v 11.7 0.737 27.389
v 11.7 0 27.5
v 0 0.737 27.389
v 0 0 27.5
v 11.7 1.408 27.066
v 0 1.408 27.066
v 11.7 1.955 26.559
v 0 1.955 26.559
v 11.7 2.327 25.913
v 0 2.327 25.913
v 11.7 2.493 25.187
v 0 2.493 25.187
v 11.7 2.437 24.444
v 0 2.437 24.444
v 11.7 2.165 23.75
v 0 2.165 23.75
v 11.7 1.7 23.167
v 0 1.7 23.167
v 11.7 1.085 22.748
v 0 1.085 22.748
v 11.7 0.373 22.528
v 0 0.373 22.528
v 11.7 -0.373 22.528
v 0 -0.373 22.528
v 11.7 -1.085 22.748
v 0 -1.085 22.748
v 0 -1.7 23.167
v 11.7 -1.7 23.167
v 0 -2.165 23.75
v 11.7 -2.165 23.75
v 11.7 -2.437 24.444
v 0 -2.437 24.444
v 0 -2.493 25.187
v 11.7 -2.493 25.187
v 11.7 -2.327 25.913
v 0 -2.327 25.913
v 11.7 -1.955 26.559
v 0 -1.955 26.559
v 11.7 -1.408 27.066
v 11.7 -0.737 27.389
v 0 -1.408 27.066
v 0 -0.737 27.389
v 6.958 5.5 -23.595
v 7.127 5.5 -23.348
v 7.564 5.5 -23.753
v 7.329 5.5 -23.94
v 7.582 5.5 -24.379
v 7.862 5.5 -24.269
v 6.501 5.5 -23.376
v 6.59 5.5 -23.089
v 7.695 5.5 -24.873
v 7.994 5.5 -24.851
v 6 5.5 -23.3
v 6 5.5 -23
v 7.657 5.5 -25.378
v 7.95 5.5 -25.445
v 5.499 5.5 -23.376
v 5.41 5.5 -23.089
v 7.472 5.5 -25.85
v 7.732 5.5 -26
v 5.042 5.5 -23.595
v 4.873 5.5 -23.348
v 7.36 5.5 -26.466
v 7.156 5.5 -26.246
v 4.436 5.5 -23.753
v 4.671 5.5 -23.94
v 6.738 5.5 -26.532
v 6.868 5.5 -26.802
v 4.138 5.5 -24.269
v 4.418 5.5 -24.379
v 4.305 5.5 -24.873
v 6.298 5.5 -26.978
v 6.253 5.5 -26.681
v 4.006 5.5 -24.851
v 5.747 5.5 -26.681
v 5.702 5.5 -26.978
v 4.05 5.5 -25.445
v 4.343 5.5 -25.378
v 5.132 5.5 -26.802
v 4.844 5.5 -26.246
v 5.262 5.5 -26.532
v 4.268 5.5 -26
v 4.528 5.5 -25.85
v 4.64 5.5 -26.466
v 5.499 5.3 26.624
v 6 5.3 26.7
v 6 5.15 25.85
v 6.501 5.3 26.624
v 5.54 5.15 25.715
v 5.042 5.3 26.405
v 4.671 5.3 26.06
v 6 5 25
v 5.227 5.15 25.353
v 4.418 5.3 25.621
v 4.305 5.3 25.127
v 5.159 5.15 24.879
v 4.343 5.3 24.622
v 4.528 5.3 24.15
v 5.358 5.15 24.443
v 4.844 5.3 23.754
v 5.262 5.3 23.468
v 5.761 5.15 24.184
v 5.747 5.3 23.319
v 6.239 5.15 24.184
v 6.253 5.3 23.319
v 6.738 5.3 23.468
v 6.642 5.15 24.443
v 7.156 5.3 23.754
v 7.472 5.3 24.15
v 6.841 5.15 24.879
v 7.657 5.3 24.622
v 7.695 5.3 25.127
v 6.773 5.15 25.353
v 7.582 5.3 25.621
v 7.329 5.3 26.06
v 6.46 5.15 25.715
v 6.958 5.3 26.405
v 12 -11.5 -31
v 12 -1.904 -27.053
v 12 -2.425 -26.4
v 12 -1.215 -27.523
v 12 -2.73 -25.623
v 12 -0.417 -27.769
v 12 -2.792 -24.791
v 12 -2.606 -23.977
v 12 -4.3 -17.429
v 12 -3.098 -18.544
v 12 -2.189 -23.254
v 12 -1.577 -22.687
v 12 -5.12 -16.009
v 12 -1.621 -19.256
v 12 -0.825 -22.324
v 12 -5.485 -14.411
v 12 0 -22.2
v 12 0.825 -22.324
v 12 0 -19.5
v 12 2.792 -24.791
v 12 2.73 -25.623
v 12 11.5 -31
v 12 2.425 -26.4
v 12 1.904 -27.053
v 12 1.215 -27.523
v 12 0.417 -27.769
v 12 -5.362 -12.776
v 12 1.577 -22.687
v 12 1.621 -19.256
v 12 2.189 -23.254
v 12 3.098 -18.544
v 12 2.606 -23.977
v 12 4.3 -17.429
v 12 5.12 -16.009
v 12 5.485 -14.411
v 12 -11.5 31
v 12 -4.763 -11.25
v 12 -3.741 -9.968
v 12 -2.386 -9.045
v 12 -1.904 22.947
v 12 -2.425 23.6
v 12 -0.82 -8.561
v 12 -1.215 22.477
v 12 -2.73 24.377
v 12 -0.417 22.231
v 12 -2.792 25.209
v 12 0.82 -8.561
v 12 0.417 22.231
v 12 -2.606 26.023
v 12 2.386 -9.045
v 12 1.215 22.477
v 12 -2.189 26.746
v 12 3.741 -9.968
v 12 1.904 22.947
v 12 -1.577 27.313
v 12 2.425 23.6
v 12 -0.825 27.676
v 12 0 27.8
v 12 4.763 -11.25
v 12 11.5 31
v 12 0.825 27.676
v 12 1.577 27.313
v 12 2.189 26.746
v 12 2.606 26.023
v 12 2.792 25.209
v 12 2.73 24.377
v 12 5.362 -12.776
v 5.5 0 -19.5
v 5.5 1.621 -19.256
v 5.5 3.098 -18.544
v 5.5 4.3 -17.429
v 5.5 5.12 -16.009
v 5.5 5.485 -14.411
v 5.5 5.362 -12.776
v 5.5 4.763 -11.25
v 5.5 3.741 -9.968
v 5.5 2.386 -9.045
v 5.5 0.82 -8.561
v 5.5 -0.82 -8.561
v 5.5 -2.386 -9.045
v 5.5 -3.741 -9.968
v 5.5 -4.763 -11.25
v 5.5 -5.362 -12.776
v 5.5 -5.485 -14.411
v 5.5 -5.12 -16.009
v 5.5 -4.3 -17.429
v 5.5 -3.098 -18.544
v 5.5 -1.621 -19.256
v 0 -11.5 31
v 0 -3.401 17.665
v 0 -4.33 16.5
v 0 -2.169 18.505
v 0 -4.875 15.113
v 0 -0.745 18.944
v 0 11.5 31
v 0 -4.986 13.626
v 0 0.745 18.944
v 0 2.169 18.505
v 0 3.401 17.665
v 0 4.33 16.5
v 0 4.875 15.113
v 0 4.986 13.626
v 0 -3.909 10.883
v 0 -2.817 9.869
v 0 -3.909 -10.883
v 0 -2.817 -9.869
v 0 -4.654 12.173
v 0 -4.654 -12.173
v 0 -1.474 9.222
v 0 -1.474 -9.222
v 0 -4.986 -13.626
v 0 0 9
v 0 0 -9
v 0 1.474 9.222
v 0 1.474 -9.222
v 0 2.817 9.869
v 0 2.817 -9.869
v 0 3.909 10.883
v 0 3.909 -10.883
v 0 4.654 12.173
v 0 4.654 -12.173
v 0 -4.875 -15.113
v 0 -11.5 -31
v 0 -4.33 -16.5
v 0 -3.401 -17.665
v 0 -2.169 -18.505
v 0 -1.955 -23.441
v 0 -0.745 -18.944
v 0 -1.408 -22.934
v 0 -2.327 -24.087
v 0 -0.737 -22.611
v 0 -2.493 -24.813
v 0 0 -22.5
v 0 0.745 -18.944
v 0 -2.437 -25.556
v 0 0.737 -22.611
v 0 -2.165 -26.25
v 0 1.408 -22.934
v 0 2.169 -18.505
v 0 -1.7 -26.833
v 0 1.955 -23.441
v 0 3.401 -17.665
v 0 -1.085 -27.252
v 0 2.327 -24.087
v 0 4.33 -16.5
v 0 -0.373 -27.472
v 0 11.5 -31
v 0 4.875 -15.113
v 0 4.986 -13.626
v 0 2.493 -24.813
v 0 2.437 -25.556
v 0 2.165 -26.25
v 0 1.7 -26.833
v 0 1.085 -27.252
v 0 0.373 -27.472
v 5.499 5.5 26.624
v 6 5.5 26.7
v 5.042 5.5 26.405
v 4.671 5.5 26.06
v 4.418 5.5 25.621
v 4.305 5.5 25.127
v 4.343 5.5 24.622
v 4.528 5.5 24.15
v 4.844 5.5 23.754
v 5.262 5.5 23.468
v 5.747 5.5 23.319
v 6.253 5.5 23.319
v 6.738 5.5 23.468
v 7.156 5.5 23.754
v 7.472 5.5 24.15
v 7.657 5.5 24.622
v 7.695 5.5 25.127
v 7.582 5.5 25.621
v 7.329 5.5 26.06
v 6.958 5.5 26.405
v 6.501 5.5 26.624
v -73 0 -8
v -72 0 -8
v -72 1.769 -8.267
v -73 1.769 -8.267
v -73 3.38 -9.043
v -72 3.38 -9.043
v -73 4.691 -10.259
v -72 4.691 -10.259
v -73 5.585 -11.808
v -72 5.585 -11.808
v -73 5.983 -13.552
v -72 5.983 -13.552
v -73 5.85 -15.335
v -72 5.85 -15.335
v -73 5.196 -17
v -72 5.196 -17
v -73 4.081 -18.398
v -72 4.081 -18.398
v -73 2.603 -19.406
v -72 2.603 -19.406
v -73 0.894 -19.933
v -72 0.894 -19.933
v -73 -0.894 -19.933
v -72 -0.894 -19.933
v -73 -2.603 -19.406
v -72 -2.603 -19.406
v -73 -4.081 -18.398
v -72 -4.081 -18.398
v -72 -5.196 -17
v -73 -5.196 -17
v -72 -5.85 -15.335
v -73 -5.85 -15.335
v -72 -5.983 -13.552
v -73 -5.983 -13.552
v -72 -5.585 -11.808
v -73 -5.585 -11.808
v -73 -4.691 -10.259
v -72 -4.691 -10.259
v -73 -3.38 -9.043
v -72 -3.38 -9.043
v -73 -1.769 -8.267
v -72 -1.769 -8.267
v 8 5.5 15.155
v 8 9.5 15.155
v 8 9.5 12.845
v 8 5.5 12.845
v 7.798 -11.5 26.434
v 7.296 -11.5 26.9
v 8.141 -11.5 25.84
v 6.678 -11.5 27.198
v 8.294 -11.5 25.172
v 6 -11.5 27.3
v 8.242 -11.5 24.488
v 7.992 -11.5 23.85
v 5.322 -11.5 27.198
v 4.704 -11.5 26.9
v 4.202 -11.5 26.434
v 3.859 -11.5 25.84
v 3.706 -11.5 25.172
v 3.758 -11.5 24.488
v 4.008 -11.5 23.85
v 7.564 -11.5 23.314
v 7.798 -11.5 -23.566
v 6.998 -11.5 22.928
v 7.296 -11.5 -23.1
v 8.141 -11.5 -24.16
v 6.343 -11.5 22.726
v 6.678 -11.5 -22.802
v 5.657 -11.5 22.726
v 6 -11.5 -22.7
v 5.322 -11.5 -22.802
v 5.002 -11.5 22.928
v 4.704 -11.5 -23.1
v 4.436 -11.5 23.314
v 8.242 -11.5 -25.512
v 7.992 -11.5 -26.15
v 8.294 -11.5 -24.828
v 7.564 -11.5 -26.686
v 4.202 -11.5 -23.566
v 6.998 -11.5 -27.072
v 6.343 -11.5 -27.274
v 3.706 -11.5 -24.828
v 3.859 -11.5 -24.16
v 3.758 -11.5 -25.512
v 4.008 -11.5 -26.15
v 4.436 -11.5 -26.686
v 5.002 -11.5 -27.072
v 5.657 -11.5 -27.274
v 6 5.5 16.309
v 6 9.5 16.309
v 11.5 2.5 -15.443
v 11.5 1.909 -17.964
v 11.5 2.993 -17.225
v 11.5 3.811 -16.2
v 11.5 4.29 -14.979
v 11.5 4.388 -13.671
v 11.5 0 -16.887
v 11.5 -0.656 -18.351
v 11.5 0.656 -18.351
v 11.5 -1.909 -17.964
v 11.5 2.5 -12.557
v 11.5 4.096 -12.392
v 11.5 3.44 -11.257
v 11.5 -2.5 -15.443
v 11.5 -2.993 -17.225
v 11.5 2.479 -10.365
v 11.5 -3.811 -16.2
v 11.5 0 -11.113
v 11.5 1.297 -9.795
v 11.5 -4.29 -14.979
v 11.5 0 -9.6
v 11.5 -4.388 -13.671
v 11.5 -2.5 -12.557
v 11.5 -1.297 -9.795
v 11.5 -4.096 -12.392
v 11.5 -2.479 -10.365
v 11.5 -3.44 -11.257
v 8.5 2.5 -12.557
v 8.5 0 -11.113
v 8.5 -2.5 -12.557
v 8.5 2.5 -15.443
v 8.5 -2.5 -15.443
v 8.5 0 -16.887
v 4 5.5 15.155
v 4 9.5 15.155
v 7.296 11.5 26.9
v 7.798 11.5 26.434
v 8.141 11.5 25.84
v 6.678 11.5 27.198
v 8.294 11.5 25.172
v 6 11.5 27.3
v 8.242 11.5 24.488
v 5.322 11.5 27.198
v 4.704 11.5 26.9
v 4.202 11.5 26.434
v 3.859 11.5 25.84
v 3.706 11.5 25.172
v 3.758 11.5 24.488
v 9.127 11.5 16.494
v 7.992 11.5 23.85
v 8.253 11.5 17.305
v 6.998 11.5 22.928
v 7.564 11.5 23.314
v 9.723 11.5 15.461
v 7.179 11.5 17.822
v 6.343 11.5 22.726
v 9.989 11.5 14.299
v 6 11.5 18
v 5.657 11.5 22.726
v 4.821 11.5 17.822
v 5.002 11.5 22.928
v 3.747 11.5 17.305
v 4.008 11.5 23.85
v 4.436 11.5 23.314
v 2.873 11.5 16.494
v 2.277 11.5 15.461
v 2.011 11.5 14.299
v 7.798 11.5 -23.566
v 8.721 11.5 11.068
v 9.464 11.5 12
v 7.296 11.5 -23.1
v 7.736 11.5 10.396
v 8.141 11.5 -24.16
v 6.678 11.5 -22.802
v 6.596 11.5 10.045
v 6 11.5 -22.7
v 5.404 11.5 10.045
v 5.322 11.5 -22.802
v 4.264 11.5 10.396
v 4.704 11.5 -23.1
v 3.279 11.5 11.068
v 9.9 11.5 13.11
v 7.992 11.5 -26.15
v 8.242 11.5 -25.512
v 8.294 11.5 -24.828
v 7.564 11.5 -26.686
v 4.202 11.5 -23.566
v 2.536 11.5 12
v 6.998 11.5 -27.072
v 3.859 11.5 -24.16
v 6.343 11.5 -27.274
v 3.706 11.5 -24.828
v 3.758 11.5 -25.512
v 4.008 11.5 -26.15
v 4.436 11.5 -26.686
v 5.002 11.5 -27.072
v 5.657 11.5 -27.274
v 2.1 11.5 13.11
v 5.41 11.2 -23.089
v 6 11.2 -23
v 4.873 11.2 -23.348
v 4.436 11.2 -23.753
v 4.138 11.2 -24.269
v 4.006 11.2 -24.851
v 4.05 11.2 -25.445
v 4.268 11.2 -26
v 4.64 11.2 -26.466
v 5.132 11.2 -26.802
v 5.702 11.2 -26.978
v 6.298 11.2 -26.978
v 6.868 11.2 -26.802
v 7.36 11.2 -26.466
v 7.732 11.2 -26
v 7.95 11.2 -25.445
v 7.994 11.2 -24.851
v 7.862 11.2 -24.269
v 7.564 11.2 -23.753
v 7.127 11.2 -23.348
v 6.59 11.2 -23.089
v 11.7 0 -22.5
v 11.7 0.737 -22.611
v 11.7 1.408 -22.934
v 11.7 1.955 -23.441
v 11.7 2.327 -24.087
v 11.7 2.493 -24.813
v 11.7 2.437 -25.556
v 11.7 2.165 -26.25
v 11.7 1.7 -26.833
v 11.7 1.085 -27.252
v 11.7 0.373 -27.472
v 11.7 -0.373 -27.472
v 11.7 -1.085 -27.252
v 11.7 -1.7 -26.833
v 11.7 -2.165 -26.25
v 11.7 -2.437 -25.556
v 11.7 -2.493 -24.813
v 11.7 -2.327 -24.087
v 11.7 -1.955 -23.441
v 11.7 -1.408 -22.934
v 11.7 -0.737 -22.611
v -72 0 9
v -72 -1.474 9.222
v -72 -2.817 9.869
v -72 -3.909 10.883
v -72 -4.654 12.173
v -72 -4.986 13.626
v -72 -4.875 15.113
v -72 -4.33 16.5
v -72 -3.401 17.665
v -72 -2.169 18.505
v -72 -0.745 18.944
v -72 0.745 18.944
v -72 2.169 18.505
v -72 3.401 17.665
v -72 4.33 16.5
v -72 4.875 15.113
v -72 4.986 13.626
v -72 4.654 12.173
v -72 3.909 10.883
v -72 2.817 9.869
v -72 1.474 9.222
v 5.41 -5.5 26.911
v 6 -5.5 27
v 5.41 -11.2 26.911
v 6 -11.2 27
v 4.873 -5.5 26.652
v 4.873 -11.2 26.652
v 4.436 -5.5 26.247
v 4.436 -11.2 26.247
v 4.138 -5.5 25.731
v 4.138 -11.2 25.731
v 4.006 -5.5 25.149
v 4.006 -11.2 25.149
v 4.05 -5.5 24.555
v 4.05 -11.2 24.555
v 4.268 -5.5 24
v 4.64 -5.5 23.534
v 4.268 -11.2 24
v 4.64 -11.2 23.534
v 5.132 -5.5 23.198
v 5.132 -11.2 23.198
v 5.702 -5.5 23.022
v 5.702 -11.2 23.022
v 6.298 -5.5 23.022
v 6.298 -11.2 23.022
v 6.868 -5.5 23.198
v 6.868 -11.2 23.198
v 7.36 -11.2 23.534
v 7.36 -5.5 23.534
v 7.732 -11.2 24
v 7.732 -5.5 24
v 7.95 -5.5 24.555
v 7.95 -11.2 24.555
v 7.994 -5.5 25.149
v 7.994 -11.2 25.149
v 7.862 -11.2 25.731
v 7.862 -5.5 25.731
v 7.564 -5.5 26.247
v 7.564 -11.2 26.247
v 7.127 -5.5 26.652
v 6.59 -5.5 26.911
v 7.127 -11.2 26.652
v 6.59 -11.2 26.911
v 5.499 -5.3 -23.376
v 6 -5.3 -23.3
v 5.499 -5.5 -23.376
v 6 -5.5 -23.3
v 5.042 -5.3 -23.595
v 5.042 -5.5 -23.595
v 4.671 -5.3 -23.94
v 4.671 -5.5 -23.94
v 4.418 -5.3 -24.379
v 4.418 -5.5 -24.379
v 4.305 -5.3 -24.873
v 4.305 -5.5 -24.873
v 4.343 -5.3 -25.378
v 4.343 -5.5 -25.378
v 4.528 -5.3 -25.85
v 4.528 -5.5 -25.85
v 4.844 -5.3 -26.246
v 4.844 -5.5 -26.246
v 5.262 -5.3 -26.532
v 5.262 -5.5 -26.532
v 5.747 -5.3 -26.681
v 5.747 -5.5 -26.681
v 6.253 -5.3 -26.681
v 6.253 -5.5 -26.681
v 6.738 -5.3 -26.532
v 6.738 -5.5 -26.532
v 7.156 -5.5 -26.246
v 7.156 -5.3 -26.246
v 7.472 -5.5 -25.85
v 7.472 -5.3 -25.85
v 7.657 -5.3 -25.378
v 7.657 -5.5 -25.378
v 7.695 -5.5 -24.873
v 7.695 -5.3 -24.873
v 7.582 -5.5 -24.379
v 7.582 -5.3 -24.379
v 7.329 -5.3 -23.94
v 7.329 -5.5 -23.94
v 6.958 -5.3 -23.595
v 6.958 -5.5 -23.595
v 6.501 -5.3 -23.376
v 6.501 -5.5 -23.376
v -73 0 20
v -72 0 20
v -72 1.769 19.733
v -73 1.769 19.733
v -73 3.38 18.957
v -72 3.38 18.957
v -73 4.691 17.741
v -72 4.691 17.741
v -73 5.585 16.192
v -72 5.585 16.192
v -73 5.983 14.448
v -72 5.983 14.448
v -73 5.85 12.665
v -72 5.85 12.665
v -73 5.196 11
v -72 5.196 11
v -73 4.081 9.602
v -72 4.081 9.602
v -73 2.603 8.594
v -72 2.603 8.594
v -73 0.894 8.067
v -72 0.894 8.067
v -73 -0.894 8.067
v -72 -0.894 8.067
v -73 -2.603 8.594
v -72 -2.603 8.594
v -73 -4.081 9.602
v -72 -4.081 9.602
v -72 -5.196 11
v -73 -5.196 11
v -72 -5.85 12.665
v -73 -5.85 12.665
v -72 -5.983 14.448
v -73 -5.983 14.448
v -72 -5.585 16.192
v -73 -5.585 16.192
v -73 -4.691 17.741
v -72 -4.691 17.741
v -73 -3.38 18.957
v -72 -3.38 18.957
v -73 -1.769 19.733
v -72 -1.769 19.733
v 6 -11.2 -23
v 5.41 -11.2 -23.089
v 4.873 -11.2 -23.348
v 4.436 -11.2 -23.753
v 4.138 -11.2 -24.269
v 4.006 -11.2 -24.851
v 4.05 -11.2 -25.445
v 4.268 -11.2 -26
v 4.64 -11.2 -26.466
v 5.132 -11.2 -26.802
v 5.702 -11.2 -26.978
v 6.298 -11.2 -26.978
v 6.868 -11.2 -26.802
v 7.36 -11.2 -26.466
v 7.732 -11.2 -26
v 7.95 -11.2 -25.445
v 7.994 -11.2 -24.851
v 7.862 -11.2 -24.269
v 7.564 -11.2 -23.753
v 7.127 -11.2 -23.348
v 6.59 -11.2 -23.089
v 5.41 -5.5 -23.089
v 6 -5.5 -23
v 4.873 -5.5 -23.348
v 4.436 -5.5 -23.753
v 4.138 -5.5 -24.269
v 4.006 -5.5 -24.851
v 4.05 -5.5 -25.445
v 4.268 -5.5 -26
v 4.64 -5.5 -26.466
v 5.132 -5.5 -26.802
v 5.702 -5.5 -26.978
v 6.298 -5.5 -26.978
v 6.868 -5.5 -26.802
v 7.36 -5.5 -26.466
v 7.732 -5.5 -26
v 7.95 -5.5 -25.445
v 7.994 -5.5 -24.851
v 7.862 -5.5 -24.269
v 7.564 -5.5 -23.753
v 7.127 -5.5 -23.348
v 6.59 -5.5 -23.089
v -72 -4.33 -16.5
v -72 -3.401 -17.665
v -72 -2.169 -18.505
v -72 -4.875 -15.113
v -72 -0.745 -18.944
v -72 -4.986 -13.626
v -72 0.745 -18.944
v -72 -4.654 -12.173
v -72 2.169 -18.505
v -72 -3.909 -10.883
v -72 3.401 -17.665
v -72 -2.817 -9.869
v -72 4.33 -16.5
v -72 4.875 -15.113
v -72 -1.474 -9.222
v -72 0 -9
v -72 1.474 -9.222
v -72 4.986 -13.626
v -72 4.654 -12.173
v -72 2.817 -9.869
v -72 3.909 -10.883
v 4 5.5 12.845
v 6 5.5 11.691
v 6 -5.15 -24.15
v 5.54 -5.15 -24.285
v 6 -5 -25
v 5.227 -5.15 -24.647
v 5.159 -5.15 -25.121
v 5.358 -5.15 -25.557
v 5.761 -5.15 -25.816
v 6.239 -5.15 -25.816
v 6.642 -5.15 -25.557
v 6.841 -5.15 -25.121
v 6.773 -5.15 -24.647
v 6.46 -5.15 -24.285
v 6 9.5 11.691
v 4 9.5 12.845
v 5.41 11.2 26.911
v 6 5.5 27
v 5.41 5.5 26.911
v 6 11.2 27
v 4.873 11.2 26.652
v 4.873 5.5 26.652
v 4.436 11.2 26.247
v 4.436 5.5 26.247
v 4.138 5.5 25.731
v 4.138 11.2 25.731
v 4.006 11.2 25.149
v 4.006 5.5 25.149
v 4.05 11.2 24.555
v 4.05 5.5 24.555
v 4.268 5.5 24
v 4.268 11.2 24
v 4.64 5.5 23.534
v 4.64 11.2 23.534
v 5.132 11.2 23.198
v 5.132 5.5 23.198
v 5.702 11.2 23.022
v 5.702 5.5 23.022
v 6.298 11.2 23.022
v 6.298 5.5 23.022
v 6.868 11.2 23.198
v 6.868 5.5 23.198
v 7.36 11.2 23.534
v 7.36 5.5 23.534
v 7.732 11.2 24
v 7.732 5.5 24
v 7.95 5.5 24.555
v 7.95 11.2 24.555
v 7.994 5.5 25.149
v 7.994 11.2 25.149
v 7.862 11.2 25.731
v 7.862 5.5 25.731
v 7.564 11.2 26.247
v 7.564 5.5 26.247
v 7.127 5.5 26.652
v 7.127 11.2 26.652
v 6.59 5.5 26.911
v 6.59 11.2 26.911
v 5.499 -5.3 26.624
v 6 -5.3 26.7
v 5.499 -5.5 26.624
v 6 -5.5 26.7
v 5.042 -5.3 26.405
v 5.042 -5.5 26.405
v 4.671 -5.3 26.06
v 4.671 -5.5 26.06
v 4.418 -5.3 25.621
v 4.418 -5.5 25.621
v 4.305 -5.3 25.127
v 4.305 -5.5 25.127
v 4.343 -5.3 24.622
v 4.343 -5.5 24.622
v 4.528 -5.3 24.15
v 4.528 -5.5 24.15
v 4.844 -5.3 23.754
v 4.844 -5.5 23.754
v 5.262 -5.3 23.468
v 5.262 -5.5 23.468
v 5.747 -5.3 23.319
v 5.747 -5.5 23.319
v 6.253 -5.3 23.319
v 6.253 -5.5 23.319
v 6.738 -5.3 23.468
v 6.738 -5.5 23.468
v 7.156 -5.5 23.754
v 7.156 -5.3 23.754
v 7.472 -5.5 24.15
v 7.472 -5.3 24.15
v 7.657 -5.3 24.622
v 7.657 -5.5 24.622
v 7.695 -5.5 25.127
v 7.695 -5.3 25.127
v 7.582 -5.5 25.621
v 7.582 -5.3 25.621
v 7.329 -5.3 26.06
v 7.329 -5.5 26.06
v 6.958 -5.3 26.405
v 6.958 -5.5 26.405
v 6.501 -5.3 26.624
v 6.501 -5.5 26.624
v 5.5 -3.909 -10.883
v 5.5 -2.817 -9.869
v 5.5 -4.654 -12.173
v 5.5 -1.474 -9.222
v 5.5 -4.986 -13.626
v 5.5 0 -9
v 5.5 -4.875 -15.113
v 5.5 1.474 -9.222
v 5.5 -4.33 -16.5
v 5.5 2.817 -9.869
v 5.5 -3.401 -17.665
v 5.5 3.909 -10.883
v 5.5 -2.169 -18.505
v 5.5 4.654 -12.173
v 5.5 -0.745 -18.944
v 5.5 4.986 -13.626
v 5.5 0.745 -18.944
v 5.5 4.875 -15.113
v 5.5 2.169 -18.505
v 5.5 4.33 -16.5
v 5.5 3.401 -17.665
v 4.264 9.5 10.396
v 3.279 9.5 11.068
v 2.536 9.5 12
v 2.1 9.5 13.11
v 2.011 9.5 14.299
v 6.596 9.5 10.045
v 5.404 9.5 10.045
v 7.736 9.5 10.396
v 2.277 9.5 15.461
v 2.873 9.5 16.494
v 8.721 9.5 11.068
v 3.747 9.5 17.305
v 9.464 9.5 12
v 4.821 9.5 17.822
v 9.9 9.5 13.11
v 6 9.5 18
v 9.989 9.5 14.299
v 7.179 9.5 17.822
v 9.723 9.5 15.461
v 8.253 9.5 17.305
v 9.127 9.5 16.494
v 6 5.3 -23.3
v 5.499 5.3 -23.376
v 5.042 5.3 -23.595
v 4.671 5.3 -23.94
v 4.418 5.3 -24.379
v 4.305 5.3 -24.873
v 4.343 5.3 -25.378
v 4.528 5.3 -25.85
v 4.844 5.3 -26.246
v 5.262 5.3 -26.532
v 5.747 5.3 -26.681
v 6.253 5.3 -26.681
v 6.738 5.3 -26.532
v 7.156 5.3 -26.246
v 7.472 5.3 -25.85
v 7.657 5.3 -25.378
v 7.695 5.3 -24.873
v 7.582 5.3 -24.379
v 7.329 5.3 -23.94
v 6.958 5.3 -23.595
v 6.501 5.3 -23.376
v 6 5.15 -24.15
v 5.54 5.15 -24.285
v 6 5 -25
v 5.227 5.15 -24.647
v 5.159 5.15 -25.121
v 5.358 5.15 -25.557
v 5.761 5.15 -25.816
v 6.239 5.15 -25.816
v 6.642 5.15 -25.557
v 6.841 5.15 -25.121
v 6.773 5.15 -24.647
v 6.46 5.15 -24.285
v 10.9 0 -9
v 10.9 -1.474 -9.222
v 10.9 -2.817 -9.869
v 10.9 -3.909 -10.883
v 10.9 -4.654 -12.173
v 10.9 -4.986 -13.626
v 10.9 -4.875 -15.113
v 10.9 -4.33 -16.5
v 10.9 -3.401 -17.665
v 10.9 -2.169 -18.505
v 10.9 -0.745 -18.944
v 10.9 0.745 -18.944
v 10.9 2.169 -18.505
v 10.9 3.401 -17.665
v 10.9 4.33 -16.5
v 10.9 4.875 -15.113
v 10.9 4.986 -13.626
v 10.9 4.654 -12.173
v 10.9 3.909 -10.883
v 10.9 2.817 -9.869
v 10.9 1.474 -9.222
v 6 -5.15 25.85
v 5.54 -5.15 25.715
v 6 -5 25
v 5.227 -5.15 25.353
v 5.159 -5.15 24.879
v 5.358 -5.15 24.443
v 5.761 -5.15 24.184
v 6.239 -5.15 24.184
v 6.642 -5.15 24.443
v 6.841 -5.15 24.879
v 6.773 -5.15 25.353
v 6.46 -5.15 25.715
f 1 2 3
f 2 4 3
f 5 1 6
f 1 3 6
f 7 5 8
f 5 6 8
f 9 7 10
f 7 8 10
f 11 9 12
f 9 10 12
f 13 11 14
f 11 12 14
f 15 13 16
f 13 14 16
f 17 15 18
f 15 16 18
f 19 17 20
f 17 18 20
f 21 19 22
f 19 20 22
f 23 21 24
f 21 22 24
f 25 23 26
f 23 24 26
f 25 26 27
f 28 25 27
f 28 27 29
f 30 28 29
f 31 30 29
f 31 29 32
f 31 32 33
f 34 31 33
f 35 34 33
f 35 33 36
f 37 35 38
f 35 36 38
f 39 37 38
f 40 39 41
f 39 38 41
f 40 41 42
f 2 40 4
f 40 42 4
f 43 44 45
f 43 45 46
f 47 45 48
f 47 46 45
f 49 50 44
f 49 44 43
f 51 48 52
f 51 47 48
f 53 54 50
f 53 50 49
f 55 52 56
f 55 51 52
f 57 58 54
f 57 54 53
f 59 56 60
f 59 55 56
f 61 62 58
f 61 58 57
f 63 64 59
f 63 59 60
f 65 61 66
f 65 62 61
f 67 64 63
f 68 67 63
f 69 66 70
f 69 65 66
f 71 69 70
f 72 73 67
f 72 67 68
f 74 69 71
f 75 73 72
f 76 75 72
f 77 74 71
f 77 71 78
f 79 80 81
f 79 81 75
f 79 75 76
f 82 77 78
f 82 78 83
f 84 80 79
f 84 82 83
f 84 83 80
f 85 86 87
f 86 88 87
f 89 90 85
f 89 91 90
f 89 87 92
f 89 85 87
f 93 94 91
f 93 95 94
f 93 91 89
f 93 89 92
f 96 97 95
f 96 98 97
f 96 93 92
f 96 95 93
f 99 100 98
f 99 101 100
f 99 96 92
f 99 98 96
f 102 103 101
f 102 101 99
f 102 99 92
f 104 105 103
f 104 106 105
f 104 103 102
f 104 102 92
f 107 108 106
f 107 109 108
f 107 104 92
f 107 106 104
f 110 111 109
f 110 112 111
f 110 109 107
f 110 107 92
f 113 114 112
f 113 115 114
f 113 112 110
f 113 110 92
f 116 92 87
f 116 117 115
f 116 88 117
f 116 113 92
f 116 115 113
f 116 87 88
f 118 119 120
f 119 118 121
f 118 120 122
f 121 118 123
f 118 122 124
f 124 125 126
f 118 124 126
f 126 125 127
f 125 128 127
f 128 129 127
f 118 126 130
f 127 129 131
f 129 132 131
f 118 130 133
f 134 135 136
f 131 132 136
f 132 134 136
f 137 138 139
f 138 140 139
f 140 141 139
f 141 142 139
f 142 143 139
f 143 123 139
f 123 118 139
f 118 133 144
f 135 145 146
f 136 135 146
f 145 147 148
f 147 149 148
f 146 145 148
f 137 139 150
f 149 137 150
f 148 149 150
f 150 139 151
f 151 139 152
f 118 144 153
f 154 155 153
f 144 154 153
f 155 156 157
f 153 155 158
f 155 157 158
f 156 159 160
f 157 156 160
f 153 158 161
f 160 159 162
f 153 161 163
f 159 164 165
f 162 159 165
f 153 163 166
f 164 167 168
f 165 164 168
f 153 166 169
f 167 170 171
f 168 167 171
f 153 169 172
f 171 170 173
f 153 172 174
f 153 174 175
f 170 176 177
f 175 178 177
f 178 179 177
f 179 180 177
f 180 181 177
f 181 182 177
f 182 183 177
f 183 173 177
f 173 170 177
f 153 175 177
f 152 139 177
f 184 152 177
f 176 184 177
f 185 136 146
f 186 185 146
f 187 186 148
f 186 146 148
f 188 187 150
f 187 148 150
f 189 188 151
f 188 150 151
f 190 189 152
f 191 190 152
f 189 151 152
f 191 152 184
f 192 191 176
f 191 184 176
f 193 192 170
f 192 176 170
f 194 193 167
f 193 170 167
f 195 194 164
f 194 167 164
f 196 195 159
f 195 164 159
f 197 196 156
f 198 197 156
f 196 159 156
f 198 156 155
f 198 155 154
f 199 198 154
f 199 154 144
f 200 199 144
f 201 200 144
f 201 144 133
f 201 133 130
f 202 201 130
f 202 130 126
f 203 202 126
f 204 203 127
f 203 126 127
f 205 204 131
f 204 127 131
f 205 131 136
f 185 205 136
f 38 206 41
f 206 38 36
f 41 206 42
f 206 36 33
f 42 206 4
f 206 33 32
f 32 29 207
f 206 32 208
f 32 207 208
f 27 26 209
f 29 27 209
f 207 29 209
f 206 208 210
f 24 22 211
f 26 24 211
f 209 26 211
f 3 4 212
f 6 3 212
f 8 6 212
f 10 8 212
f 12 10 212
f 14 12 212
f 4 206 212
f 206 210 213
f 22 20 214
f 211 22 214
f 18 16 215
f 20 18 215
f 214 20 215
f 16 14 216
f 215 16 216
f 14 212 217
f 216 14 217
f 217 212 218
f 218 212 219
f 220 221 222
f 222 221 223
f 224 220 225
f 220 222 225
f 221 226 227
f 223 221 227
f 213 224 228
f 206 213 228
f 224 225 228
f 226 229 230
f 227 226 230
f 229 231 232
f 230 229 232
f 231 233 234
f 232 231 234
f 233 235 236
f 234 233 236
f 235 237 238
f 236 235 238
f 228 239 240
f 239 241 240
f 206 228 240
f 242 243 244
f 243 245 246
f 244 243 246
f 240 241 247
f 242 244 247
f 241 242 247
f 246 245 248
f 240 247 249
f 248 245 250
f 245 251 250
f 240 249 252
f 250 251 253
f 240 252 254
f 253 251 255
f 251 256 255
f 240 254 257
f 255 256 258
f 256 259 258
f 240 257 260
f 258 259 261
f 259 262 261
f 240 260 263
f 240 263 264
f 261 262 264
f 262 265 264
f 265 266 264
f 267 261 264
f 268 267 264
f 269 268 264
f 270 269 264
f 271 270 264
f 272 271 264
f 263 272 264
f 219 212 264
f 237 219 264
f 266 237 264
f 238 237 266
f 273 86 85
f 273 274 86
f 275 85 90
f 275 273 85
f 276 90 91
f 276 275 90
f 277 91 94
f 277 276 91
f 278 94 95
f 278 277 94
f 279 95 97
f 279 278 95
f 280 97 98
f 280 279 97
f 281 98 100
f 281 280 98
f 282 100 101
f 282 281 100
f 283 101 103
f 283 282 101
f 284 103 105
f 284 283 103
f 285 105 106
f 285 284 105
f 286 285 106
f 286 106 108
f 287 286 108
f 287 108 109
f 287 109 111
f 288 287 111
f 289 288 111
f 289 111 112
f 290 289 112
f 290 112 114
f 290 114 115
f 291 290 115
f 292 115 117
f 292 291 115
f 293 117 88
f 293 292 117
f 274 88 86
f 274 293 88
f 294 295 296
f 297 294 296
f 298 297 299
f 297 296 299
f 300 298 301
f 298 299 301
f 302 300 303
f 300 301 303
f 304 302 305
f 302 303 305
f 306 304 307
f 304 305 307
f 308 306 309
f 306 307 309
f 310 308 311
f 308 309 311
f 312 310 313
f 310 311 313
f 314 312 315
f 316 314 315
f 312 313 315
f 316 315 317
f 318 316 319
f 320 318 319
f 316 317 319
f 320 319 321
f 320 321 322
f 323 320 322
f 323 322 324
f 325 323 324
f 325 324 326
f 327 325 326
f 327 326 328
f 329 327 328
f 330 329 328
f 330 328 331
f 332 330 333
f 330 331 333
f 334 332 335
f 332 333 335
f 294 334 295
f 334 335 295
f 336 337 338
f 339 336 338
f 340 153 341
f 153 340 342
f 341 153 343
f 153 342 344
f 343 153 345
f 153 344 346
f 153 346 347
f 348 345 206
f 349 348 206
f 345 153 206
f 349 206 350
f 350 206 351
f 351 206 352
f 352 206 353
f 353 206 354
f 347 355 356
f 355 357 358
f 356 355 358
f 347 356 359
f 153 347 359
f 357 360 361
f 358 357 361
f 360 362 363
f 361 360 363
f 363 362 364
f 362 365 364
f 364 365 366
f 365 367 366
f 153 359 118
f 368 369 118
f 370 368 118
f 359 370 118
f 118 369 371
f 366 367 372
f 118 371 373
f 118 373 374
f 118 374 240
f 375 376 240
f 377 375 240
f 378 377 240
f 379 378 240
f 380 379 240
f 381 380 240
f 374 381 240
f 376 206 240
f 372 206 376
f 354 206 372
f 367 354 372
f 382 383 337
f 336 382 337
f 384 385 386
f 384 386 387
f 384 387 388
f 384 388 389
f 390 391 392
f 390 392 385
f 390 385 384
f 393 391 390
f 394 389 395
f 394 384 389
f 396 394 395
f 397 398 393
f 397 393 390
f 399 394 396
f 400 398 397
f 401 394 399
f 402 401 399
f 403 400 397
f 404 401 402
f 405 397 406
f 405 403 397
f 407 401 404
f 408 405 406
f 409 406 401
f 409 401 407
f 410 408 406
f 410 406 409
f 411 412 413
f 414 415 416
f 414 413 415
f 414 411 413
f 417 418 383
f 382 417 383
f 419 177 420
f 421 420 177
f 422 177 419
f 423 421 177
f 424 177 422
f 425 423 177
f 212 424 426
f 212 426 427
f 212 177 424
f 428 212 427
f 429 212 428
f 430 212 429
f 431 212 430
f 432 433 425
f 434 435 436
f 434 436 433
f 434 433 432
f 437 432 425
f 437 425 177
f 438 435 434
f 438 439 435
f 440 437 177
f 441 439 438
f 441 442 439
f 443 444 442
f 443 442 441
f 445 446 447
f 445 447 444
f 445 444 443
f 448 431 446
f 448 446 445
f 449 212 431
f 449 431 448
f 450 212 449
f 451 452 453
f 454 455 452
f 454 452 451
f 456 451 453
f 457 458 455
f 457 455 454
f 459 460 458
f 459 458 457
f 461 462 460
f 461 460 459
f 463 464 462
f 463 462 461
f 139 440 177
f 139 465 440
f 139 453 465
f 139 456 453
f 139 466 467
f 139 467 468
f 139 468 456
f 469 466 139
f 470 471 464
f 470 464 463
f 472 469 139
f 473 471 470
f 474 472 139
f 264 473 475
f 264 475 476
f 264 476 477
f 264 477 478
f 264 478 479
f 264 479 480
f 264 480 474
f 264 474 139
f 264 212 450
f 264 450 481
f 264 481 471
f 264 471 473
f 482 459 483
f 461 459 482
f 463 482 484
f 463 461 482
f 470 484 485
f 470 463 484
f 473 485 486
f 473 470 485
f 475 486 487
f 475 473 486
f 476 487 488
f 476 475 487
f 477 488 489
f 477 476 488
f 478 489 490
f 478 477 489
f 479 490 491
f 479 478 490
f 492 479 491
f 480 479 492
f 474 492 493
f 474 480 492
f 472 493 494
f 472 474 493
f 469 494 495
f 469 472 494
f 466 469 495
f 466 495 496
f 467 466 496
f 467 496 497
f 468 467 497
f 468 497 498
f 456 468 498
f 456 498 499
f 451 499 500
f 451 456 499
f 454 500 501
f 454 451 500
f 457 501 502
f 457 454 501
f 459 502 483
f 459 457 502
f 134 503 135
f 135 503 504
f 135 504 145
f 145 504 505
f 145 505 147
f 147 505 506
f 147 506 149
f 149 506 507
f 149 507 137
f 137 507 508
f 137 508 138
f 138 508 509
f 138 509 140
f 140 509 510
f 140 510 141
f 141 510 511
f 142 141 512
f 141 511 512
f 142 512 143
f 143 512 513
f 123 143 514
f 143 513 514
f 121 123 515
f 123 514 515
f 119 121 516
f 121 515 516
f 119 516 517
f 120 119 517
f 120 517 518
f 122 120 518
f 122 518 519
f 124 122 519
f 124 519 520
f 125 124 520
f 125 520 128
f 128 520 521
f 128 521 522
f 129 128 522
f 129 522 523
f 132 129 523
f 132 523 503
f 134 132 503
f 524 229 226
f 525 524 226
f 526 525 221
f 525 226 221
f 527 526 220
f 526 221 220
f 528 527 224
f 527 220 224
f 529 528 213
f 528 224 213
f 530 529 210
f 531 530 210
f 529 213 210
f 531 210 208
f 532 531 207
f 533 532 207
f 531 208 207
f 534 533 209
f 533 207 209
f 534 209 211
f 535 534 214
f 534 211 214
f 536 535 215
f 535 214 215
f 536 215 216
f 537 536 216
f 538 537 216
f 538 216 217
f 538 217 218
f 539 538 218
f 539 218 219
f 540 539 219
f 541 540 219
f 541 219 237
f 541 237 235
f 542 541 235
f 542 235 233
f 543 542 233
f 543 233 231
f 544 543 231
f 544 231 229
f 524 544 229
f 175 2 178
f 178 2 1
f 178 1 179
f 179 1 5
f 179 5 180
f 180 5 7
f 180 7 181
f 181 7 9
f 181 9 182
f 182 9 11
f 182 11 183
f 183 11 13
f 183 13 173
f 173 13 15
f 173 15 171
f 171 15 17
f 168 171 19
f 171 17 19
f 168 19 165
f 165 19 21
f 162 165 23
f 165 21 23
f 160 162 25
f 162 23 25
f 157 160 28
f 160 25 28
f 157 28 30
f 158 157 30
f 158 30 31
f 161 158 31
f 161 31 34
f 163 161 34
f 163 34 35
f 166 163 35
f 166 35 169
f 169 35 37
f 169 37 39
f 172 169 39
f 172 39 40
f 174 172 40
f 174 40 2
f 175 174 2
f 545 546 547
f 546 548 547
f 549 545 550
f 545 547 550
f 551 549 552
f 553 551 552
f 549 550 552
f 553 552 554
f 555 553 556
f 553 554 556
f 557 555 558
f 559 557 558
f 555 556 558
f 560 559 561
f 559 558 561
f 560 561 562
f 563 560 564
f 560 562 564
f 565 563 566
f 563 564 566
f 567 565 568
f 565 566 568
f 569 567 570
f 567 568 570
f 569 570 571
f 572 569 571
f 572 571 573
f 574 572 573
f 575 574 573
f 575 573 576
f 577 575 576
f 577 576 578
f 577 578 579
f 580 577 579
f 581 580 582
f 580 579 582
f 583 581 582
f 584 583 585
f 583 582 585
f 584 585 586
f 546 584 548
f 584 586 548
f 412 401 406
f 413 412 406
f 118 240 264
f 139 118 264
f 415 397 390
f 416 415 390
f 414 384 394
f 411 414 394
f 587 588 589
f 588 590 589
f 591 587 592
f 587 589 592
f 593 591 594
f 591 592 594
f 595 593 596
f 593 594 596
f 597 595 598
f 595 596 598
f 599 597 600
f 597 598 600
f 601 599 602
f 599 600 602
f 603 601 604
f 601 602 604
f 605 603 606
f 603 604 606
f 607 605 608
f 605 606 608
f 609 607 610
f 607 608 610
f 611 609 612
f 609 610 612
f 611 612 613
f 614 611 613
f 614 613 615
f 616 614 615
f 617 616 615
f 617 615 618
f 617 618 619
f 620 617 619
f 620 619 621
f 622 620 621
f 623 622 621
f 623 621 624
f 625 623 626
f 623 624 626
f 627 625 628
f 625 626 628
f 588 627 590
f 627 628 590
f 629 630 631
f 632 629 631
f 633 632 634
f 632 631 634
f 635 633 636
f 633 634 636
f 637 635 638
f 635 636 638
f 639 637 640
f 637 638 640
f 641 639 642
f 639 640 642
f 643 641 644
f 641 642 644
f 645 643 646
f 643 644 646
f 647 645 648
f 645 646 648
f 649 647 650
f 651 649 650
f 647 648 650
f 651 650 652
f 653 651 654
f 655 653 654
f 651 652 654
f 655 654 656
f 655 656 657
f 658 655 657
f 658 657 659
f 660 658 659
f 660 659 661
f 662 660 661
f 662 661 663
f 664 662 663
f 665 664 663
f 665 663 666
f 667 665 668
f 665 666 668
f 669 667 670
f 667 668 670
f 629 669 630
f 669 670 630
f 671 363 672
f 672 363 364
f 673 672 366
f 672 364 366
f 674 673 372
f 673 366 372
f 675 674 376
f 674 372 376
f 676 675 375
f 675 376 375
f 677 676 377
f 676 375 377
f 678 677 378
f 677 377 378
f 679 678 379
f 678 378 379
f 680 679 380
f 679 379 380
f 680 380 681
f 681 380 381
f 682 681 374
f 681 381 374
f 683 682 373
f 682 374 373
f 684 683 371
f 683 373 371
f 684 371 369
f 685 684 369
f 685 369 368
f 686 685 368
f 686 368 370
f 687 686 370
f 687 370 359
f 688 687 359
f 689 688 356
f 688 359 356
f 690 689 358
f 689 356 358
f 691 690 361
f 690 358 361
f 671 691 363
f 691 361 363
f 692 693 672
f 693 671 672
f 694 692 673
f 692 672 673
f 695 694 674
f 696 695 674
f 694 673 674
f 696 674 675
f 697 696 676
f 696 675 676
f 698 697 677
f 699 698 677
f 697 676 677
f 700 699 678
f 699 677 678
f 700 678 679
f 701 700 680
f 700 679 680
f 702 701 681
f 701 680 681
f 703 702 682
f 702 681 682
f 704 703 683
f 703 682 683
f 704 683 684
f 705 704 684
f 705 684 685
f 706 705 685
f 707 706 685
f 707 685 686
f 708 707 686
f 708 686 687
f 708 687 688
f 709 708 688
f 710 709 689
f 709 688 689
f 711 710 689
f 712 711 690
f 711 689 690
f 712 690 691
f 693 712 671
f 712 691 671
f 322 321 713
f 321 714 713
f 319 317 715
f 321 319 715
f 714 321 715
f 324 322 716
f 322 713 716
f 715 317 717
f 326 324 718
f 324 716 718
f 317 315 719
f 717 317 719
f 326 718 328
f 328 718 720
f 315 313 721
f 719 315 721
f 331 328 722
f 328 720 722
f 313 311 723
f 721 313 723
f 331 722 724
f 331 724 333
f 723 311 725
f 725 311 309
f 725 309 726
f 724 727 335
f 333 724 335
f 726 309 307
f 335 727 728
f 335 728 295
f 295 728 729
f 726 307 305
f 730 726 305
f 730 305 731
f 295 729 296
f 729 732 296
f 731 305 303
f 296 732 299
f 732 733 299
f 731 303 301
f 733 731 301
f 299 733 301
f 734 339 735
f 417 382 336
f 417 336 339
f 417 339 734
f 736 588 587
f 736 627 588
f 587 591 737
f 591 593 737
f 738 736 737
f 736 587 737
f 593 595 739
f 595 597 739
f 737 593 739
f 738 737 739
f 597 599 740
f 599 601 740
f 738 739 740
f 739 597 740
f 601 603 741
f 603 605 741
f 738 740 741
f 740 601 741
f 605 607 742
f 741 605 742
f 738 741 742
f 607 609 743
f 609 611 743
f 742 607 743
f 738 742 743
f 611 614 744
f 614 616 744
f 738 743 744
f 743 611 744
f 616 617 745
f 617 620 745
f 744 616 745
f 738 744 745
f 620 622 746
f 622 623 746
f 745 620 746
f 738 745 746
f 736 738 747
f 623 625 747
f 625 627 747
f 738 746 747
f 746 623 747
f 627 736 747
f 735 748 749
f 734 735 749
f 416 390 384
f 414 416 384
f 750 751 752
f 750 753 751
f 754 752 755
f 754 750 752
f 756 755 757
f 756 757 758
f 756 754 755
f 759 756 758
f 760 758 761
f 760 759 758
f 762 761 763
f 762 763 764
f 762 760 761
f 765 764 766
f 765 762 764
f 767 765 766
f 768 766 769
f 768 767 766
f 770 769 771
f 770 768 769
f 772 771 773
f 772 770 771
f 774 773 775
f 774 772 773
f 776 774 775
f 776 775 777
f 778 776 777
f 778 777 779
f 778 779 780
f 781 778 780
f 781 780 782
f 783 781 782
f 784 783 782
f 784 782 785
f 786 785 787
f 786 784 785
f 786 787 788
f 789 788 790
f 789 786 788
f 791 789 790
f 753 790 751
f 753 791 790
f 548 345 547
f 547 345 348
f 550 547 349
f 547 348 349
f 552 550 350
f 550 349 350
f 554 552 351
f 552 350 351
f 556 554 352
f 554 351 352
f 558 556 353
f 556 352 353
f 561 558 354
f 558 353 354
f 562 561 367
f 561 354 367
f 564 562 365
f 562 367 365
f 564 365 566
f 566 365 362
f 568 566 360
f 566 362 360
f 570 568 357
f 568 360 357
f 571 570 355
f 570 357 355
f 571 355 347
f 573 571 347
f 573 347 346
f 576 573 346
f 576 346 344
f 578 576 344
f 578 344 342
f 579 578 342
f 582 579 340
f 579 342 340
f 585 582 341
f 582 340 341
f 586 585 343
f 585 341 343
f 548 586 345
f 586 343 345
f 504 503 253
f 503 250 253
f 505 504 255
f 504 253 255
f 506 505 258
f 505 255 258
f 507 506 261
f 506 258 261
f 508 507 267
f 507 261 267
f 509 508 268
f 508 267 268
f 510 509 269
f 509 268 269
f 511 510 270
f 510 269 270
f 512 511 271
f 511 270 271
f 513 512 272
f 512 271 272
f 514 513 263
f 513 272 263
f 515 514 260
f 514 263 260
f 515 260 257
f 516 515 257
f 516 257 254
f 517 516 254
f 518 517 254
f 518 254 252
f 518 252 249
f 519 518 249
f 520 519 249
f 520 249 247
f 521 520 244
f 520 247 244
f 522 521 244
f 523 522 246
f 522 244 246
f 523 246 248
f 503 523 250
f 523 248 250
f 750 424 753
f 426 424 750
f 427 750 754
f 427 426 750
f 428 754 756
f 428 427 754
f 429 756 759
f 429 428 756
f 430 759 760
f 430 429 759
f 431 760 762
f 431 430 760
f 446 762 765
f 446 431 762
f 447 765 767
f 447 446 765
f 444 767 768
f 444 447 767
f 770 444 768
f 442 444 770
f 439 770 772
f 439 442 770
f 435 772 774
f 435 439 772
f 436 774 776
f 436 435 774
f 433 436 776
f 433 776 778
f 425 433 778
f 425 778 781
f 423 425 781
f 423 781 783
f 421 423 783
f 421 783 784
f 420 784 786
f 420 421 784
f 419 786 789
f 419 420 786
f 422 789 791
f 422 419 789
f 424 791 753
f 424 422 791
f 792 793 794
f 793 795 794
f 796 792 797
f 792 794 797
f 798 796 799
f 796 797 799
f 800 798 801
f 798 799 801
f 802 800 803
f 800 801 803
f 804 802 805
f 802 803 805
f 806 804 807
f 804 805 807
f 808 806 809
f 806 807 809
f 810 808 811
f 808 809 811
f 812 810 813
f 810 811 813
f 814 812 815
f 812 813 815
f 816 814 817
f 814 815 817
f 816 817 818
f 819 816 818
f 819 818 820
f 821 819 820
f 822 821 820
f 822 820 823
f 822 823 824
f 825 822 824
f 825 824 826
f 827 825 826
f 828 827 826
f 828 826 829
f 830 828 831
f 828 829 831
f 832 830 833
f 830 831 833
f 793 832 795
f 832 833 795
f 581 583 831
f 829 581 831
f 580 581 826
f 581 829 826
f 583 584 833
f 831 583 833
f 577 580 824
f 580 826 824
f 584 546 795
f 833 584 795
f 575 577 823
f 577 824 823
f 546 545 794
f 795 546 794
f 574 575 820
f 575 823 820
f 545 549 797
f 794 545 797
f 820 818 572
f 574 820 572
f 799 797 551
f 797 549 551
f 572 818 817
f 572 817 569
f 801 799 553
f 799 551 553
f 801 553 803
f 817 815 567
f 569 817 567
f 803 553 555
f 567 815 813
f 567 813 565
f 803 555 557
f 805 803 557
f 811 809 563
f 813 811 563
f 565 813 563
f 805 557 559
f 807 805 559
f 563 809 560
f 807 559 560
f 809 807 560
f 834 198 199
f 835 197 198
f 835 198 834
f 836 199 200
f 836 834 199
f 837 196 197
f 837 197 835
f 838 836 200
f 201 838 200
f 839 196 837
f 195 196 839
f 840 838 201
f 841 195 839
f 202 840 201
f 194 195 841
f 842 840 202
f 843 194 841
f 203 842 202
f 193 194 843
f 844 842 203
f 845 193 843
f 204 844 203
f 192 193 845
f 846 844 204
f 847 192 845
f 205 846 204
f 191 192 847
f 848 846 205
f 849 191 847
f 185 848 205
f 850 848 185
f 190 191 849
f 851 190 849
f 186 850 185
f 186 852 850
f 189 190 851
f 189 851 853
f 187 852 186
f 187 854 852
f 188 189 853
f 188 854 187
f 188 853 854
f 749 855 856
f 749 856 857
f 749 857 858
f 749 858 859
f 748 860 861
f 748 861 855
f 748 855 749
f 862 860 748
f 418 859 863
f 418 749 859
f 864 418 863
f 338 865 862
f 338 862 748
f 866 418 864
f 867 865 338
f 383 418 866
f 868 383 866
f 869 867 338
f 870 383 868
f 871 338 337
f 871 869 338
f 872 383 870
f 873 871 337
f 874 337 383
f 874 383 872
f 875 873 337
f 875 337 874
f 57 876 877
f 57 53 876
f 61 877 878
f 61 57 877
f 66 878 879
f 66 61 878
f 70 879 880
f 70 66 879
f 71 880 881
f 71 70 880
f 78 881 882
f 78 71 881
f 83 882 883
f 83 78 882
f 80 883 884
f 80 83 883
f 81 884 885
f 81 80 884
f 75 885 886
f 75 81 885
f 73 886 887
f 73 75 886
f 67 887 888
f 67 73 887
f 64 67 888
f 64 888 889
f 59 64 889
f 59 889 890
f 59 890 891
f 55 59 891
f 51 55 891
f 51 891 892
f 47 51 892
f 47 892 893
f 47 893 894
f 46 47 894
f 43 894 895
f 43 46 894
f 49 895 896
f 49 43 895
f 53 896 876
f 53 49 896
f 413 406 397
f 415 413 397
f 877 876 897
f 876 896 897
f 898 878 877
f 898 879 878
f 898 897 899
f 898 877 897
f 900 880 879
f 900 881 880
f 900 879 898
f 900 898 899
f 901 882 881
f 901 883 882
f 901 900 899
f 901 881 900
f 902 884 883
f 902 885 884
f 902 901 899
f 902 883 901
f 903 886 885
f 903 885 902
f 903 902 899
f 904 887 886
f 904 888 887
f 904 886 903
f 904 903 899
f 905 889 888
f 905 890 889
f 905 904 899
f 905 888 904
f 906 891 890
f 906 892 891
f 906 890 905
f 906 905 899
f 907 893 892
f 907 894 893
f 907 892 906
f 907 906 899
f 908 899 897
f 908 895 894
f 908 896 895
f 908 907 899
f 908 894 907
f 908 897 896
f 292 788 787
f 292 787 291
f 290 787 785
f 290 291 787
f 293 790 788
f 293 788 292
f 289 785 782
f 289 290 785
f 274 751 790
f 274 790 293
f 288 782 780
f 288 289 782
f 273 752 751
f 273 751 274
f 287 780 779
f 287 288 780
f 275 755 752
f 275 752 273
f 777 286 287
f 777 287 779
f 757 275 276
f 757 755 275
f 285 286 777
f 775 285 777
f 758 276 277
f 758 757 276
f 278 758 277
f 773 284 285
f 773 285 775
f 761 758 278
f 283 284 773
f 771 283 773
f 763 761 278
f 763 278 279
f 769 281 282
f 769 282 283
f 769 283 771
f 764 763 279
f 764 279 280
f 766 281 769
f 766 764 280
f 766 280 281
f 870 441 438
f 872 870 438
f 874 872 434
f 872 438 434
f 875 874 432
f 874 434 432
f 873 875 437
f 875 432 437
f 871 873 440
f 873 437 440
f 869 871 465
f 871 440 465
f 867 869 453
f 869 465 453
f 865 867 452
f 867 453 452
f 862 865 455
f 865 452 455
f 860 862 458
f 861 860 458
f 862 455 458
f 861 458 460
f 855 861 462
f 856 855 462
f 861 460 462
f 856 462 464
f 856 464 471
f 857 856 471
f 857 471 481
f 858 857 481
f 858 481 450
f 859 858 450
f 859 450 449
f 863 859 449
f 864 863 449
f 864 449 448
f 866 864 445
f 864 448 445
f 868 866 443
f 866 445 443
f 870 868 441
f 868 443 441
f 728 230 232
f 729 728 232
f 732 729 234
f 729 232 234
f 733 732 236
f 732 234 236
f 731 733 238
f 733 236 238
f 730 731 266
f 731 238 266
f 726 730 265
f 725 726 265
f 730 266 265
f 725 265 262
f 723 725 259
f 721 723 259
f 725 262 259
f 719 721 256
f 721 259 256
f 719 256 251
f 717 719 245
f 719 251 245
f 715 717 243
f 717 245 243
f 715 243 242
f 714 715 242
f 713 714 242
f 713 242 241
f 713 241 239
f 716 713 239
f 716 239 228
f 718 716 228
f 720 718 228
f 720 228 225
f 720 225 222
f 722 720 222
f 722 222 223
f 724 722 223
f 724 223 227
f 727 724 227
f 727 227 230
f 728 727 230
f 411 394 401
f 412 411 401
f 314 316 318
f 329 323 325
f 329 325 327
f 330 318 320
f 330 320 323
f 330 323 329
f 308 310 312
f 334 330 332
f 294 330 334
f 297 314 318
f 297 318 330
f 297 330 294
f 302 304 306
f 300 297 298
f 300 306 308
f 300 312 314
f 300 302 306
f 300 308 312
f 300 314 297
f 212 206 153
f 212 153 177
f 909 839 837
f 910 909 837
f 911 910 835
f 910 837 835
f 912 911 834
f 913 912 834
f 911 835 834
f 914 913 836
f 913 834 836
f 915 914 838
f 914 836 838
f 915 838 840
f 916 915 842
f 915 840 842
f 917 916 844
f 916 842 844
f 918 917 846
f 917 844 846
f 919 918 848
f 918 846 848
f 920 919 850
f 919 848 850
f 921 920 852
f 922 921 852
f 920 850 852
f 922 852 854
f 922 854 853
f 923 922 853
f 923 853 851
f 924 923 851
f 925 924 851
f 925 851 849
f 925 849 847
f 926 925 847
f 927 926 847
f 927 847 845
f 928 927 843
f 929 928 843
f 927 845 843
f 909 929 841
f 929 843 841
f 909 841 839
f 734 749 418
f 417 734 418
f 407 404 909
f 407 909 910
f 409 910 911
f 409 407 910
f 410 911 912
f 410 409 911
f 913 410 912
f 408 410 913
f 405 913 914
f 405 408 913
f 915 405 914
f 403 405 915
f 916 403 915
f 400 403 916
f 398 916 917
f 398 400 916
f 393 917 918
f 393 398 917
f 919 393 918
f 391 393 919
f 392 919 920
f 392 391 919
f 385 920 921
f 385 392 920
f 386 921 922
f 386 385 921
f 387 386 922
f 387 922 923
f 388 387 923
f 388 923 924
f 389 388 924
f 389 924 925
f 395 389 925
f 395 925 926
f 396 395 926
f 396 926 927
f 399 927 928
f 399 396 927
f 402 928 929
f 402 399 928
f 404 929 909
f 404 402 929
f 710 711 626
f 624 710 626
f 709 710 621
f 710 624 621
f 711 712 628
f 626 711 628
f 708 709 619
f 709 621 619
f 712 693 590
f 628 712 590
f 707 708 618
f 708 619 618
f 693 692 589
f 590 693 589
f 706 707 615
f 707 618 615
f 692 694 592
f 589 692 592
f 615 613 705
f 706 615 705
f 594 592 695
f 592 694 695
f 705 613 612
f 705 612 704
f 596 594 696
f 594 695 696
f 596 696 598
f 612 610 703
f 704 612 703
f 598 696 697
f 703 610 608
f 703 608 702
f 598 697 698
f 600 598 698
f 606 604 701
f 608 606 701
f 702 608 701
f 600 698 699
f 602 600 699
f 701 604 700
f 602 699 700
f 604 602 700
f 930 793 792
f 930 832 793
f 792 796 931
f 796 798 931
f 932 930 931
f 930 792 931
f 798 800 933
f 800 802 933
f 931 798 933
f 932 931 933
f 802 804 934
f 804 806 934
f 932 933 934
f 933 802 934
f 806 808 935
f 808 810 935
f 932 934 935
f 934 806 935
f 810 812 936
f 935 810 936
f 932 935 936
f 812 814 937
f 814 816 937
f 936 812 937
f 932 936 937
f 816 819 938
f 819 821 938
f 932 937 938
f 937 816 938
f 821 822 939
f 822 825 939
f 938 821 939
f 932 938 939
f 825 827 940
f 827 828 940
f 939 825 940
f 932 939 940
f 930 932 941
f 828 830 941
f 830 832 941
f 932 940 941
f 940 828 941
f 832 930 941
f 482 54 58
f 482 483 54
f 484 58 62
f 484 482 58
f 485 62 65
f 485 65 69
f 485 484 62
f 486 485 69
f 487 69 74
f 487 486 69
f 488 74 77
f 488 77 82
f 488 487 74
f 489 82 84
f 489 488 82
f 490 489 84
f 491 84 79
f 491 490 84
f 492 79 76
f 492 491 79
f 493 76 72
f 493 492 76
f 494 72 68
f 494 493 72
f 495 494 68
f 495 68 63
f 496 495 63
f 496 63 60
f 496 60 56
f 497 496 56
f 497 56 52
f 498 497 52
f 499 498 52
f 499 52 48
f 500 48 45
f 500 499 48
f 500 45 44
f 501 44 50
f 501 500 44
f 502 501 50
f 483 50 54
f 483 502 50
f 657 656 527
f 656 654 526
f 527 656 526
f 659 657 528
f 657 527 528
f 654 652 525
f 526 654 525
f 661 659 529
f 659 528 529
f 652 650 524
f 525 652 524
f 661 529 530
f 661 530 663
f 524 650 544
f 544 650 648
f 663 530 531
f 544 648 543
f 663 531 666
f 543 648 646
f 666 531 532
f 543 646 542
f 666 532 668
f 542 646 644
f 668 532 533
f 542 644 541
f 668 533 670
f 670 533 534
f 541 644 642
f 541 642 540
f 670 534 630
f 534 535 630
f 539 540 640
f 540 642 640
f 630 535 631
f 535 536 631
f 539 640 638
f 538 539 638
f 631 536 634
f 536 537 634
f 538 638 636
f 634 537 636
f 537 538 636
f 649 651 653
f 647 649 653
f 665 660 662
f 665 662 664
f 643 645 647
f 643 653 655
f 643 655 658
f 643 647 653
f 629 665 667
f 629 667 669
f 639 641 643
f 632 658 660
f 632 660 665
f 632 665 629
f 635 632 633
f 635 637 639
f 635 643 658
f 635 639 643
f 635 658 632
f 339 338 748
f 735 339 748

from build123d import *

# Parameters (mm, degrees)
PLATE_SKETCH_W               = 62
PLATE_SKETCH_H               = 23
PLATE_DEPTH                  = 12
TAPPED_HOLE_FACE_D           = 5
TAPPED_HOLE_FACE_CSINK_D     = 5.6
TAPPED_HOLE_FACE_CSINK_ANGLE = 90
RODS_DEPTH                   = 60
RODS_DEPTH_BACK              = 24
RODS_SKETCH_R                = 5
PISTON_SKETCH_R              = 6
PISTON_DEPTH                 = 1
TAPPED_HOLES_TOP_AT_2_COUNT  = 2
TAPPED_HOLES_TOP_AT_2_PITCH  = 50
SHCS_SEAT_SKETCH_R           = 5.5
SHCS_SEAT_DEPTH              = 6.5
SHCS_HEAD_SKETCH_R           = 5
SHCS_HEAD_DEPTH              = 6
SHCS_HEX_DEPTH               = 3
SHCS_CHAM_SIZE               = 0.6
SS_SEAT_SKETCH_R             = 4
SS_SEAT_DEPTH                = 2
SS_HEX_DEPTH                 = 4


with BuildPart() as part:
    # Plate_Sketch → Plate (new body)
    with BuildSketch(Plane(origin=(0, 0, 0), x_dir=(0, 0, -1), z_dir=(1, 0, 0))):
        Rectangle(PLATE_SKETCH_W, PLATE_SKETCH_H)
    extrude(amount=PLATE_DEPTH)

    # Tapped Hole Face (through all)
    with Locations(Plane(origin=(12, 0, 0), x_dir=(0, 0, -1), z_dir=(1, 0, 0))):
        with Locations((-25, 0), (25, 0)):
            CounterSinkHole(TAPPED_HOLE_FACE_D / 2, TAPPED_HOLE_FACE_CSINK_D / 2, counter_sink_angle=TAPPED_HOLE_FACE_CSINK_ANGLE)

    # Rods_Sketch → Rods (add, two sides: drawn at the far end of the back side and taken through both)
    with BuildSketch(Plane.ZY.offset(12).offset(-RODS_DEPTH_BACK)):
        with Locations((-14, 0)):
            Circle(RODS_SKETCH_R)
        with Locations(Location((14, 0, 0), (0, 0, 180))):
            Circle(RODS_SKETCH_R)
    extrude(amount=RODS_DEPTH + RODS_DEPTH_BACK)

    # Piston_Sketch → Piston (add)
    with BuildSketch(Plane.ZY.offset(72)):
        with Locations((-14, 0)):
            Circle(PISTON_SKETCH_R)
        with Locations((14, 0)):
            Circle(PISTON_SKETCH_R)
    extrude(amount=PISTON_DEPTH)

    # Tapped Holes Top Profile → Tapped Holes Top (revolve, cut)
    with BuildSketch(Plane(origin=(6, 11.5, -25), x_dir=(0, 0, 1), z_dir=(1, 0, 0))):
        Polygon((0, 0), (0, 6.499755867), (1.7, 6.2), (1.7, 6), (2, 6), (2, 0.3), (2.3, 0), align=None)
    tapped_holes_top = revolve(axis=Axis((6, 17.85, -25), (0, -1, 0)), mode=Mode.SUBTRACT)

    # Tapped Holes Top at 2: Tapped Holes Top ×2
    with Locations(*[(0, 0, i * TAPPED_HOLES_TOP_AT_2_PITCH) for i in range(1, TAPPED_HOLES_TOP_AT_2_COUNT)]):
        add(tapped_holes_top, mode=Mode.SUBTRACT)

    # Tapped Holes Top Mirror: Tapped Holes Top across plane
    add(tapped_holes_top.mirror(Plane.ZX), mode=Mode.SUBTRACT)

    # Tapped Holes Top Mirror copy 1 sketch → Tapped Holes Top Mirror copy 1 (revolve, cut)
    with BuildSketch(Plane(origin=(6, -11.5, 25), x_dir=(0, 0, 1), z_dir=(1, 0, 0))):
        Polygon((0, 0), (0, -6.499755867), (1.7, -6.2), (1.7, -6), (2, -6), (2, -0.3), (2.3, 0), align=None)
    revolve(axis=Axis((6, -17.85, 25), (0, -1, 0)), mode=Mode.SUBTRACT)

    # SHCS Seat_Sketch → SHCS Seat (cut)
    with BuildSketch(Plane(origin=(12, 0, 0), x_dir=(0, 0, -1), z_dir=(1, 0, 0))):
        with Locations((14, 0)):
            Circle(SHCS_SEAT_SKETCH_R)
    extrude(amount=-SHCS_SEAT_DEPTH, mode=Mode.SUBTRACT)

    # SHCS Head_Sketch → SHCS Head (add)
    with BuildSketch(Plane(origin=(5.5, 0, 0), x_dir=(0, 0, -1), z_dir=(1, 0, 0))):
        with Locations(Location((14, 0, 0), (0, 0, 180))):
            Circle(SHCS_HEAD_SKETCH_R)
    extrude(amount=SHCS_HEAD_DEPTH)

    # SHCS Hex_Sketch → SHCS Hex (cut)
    with BuildSketch(Plane(origin=(11.5, 0, 0), x_dir=(0, 0, -1), z_dir=(1, 0, 0))):
        Polygon((15.443375673, -2.5), (16.886751346, 0), (15.443375673, 2.5), (12.556624327, 2.5), (11.113248654, 0), (12.556624327, -2.5), align=None)
    extrude(amount=-SHCS_HEX_DEPTH, mode=Mode.SUBTRACT)

    # SHCS Cham
    shcs_cham_edges = [part.edges().sort_by_distance(p)[0] for p in [
        (11.5, 0, -19),
    ]]
    chamfer(shcs_cham_edges, length=SHCS_CHAM_SIZE)

    # SS Seat_Sketch → SS Seat (cut)
    with BuildSketch(Plane(origin=(0, 11.5, 0), x_dir=(-1, 0, 0), z_dir=(0, 1, 0))):
        with Locations(Location((-6, 14, 0), (0, 0, 90))):
            Circle(SS_SEAT_SKETCH_R)
    extrude(amount=-SS_SEAT_DEPTH, mode=Mode.SUBTRACT)

    # SS Hex_Sketch → SS Hex (cut)
    with BuildSketch(Plane(origin=(0, 9.5, 0), x_dir=(-1, 0, 0), z_dir=(0, 1, 0))):
        Polygon((-8, 12.845299462), (-6, 11.690598923), (-4, 12.845299462), (-4, 15.154700538), (-6, 16.309401077), (-8, 15.154700538), align=None)
    extrude(amount=-SS_HEX_DEPTH, mode=Mode.SUBTRACT)


solid = part.part
